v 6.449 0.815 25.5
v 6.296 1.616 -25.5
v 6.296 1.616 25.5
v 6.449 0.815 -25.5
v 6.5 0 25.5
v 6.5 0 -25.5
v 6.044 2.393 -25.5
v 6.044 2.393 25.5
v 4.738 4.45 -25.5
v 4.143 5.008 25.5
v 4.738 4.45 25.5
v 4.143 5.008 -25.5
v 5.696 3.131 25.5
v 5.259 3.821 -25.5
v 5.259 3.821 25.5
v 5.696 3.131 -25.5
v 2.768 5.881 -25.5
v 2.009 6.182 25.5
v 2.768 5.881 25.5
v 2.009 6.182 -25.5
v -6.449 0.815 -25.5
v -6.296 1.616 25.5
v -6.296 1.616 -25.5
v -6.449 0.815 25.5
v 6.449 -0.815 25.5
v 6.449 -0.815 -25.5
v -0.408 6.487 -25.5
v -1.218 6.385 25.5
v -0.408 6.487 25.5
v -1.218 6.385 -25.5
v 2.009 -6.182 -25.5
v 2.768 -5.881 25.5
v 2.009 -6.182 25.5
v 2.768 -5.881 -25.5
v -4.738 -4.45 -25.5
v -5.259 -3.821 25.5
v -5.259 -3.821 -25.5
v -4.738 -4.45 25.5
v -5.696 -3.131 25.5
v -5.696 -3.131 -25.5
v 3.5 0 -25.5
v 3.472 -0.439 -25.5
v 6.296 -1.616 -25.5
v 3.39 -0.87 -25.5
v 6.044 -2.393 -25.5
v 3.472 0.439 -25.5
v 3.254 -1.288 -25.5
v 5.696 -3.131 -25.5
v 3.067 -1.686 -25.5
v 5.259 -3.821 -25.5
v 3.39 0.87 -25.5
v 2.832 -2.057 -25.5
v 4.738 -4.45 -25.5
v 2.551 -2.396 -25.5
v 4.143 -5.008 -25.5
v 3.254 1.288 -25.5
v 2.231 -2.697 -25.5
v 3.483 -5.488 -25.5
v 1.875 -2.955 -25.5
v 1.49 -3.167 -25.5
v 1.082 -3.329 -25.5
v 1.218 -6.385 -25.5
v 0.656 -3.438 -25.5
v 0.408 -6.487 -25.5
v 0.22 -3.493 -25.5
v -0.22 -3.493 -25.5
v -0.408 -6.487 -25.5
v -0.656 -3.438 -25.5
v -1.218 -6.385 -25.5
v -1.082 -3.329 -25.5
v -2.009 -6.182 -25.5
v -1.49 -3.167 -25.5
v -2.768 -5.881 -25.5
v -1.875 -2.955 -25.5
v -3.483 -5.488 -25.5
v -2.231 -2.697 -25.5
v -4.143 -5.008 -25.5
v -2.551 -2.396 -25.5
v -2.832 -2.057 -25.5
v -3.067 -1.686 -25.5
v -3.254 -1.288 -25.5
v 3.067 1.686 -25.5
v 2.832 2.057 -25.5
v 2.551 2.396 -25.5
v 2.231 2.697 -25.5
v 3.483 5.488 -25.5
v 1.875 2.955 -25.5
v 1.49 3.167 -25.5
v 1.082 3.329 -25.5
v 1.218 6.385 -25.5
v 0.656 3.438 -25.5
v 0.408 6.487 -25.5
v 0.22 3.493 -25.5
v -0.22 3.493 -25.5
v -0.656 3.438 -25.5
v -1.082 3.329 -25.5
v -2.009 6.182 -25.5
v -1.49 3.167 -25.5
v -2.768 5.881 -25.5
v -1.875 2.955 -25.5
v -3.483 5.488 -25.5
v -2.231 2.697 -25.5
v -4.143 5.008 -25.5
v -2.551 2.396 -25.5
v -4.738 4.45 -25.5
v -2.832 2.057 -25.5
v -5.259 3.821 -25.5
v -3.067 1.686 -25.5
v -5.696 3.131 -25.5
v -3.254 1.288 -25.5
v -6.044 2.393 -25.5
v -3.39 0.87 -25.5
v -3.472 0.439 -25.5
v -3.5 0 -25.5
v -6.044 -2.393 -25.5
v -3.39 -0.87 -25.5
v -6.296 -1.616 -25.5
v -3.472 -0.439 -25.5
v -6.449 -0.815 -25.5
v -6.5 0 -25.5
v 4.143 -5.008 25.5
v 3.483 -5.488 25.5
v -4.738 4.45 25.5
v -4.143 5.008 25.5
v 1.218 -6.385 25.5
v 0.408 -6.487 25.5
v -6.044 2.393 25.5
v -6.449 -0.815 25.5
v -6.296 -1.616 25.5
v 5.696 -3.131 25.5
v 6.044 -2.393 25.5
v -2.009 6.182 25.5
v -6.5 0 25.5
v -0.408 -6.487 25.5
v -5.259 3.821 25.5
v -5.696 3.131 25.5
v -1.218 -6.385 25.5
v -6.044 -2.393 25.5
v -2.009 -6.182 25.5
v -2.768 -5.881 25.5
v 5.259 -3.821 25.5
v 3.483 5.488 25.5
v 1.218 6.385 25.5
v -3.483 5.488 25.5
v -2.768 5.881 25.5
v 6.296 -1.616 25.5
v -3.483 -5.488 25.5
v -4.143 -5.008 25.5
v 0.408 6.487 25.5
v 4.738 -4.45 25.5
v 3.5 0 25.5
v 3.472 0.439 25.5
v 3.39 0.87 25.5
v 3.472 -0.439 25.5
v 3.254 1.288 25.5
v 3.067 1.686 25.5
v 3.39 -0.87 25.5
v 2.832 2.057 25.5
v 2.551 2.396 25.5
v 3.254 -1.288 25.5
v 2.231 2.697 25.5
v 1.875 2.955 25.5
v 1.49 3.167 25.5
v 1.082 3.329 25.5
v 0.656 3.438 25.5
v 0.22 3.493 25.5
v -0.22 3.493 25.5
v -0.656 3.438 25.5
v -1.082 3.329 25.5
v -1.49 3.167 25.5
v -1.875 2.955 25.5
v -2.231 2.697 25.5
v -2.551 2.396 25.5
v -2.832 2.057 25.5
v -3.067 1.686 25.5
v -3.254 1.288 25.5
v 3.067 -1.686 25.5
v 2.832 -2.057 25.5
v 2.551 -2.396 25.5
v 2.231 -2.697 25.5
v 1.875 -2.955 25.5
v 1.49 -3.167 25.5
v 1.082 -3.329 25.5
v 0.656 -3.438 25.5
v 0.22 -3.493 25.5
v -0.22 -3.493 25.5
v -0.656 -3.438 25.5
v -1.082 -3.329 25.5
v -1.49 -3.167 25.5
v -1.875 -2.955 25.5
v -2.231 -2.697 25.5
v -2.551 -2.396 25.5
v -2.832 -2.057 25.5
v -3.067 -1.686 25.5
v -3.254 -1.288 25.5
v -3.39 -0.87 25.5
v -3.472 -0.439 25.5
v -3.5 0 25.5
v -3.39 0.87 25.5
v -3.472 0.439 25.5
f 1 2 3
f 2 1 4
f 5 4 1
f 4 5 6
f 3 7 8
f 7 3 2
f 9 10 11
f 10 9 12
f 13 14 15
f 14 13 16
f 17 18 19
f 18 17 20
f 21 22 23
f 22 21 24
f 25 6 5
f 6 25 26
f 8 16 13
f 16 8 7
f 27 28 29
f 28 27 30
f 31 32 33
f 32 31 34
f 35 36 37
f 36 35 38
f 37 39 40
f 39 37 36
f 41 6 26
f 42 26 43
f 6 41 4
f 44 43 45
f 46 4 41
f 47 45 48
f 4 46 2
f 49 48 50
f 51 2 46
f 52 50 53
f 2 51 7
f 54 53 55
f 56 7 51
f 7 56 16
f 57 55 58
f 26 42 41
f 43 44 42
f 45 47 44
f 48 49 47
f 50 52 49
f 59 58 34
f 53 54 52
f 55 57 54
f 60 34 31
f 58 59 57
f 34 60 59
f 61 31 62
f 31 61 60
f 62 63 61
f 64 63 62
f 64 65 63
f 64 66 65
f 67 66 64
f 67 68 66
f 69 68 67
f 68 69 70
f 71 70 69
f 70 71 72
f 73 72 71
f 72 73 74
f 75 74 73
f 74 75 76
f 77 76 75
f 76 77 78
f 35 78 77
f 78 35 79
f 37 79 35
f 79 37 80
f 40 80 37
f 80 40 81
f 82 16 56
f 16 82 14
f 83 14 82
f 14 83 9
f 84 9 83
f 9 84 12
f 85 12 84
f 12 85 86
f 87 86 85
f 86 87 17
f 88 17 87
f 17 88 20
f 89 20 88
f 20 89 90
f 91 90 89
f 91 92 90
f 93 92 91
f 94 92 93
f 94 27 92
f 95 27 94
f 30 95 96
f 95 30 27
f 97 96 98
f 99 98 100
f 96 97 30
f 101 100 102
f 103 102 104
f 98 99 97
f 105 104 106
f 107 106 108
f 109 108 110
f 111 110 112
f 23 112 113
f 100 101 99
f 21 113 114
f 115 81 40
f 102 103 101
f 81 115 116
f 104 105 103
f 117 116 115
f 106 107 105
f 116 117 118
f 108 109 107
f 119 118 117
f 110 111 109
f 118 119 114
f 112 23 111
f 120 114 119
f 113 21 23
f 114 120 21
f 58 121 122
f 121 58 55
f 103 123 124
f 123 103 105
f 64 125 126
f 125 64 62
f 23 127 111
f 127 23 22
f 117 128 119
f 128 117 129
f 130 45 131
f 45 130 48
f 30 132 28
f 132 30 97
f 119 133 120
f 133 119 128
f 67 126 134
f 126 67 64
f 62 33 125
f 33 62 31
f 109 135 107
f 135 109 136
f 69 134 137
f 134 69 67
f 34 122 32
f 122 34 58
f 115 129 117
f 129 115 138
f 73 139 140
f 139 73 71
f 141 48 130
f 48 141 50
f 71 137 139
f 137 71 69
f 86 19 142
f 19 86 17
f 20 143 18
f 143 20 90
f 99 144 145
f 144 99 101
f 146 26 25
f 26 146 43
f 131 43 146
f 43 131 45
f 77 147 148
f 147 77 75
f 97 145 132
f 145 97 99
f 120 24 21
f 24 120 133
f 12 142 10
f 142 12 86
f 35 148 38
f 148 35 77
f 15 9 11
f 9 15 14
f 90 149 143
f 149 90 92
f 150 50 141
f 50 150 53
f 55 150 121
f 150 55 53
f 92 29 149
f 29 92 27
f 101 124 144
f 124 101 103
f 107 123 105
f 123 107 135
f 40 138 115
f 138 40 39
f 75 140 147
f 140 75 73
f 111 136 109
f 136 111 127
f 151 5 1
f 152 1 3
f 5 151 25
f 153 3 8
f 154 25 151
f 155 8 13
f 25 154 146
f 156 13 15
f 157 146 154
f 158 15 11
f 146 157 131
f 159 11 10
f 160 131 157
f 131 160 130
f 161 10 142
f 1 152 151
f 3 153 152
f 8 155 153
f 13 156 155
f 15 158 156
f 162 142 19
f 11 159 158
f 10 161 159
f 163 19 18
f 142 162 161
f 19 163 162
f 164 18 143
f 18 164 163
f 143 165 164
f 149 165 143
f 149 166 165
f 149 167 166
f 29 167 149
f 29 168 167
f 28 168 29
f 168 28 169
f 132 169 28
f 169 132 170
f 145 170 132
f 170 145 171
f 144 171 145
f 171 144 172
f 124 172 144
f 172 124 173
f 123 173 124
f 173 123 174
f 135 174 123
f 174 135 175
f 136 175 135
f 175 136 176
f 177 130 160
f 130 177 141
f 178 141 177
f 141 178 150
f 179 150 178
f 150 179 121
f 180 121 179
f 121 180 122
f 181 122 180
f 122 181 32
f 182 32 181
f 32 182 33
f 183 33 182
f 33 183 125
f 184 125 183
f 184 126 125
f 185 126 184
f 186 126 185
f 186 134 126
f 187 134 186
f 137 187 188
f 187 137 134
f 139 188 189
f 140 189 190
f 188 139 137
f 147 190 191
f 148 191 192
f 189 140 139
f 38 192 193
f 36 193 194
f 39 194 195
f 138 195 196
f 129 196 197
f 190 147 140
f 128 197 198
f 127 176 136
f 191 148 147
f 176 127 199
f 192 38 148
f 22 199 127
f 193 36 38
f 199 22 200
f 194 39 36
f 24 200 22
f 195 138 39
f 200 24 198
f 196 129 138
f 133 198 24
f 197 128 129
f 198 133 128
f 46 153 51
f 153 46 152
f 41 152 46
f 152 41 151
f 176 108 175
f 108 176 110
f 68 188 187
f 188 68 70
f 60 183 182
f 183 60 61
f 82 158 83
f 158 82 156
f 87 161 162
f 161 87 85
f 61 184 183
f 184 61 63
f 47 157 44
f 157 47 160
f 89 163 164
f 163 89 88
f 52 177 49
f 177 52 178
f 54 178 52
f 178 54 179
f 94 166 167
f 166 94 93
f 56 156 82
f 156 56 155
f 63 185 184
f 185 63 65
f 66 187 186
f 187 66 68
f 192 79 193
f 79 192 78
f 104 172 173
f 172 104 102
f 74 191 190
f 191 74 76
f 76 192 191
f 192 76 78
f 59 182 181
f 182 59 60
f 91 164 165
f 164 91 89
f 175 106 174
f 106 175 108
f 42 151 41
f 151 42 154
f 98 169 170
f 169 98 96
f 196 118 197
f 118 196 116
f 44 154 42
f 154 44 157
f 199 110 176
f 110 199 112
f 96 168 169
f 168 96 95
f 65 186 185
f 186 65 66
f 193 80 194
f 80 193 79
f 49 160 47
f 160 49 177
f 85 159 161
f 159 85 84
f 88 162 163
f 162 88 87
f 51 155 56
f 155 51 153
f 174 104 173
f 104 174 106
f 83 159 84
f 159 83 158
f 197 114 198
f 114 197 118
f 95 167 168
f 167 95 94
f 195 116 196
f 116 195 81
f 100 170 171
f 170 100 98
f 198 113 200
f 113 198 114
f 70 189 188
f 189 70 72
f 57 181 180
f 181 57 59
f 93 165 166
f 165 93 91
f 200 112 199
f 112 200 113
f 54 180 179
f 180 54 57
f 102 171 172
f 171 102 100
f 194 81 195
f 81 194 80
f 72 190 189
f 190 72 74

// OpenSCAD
$fn = 50;


difference() {
	union() {
		translate(v = [0, 0, -25.5000000000]) {
			cylinder(h = 51, r = 6.5000000000);
		}
	}
	union() {
		translate(v = [0, 0, -100.0000000000]) {
			cylinder(h = 200, r = 3.5000000000);
		}
	}
}
